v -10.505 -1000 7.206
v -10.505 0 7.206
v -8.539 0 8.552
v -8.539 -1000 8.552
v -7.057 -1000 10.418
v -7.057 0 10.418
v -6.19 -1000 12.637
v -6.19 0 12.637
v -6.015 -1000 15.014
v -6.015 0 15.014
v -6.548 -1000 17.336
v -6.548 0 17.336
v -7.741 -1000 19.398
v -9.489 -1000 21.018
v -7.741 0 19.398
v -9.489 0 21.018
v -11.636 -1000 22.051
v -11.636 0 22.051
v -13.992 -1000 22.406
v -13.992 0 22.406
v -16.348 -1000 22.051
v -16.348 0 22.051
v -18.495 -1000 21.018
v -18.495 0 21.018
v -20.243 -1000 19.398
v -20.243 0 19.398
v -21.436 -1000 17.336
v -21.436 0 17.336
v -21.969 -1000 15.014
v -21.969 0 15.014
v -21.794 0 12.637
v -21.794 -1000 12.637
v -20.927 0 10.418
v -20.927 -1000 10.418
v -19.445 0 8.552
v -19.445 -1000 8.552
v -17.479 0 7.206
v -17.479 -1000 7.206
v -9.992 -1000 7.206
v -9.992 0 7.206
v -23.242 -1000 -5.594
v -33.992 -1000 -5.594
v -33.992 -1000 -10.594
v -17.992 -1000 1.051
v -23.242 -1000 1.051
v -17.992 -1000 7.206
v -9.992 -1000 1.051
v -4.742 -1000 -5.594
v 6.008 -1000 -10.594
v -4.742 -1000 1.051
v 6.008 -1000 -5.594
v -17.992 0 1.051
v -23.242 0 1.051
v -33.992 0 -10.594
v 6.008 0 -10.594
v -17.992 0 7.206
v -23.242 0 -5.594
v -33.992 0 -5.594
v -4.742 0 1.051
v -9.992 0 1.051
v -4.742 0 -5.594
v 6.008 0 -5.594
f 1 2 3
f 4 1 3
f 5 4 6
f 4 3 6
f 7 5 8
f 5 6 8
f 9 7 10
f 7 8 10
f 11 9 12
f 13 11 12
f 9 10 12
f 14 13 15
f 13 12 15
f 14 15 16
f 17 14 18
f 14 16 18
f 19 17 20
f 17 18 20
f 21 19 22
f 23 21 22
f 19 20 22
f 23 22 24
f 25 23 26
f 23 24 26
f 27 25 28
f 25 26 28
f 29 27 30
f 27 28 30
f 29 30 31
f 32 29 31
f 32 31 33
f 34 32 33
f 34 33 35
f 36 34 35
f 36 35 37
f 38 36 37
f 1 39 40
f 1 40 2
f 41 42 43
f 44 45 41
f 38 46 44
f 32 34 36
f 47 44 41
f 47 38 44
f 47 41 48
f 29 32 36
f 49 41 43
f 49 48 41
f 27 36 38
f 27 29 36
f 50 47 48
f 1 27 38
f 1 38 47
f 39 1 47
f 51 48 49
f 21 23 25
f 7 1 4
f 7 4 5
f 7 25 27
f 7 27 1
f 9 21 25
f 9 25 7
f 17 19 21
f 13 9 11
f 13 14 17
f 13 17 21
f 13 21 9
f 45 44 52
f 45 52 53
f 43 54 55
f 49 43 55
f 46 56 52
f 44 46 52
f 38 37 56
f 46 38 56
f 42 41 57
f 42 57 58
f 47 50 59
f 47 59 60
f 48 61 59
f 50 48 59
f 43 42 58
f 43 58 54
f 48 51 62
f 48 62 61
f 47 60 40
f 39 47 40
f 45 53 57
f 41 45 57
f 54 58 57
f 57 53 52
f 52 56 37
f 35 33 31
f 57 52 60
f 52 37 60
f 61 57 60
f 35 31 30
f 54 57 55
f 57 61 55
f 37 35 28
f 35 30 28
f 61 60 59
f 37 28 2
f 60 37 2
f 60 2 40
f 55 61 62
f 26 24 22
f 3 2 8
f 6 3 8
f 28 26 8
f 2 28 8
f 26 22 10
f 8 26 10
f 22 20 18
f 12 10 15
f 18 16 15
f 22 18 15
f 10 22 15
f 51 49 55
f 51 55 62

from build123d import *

# Parameters (mm, degrees)
F1_DEPTH = 1000


with BuildPart() as f1:
    # F0 (on Front) → F1 (new body)
    with BuildSketch(Plane.XZ):
        with BuildLine():
            Line((-33.991796, -5.594154), (-33.991796, -10.594154))
            Line((-33.991796, -10.594154), (6.008204, -10.594154))
            Line((6.008204, -10.594154), (6.008204, -5.594154))
            Line((6.008204, -5.594154), (-4.741796, -5.594154))
            Line((-4.741796, -5.594154), (-4.741796, 1.051143))
            Line((-4.741796, 1.051143), (-9.991796, 1.051143))
            Line((-9.991796, 1.051143), (-9.991796, 7.205846))
            Line((-9.991796, 7.205846), (-10.504677, 7.205846))
            ThreePointArc((-10.504677, 7.205846), (-13.991796, 22.405846), (-17.478915, 7.205846))
            Line((-17.478915, 7.205846), (-17.991796, 7.205846))
            Line((-17.991796, 7.205846), (-17.991796, 1.051143))
            Line((-17.991796, 1.051143), (-23.241796, 1.051143))
            Line((-23.241796, 1.051143), (-23.241796, -5.594154))
            Line((-23.241796, -5.594154), (-33.991796, -5.594154))
        make_face()
    extrude(amount=F1_DEPTH)


solid = f1.part
